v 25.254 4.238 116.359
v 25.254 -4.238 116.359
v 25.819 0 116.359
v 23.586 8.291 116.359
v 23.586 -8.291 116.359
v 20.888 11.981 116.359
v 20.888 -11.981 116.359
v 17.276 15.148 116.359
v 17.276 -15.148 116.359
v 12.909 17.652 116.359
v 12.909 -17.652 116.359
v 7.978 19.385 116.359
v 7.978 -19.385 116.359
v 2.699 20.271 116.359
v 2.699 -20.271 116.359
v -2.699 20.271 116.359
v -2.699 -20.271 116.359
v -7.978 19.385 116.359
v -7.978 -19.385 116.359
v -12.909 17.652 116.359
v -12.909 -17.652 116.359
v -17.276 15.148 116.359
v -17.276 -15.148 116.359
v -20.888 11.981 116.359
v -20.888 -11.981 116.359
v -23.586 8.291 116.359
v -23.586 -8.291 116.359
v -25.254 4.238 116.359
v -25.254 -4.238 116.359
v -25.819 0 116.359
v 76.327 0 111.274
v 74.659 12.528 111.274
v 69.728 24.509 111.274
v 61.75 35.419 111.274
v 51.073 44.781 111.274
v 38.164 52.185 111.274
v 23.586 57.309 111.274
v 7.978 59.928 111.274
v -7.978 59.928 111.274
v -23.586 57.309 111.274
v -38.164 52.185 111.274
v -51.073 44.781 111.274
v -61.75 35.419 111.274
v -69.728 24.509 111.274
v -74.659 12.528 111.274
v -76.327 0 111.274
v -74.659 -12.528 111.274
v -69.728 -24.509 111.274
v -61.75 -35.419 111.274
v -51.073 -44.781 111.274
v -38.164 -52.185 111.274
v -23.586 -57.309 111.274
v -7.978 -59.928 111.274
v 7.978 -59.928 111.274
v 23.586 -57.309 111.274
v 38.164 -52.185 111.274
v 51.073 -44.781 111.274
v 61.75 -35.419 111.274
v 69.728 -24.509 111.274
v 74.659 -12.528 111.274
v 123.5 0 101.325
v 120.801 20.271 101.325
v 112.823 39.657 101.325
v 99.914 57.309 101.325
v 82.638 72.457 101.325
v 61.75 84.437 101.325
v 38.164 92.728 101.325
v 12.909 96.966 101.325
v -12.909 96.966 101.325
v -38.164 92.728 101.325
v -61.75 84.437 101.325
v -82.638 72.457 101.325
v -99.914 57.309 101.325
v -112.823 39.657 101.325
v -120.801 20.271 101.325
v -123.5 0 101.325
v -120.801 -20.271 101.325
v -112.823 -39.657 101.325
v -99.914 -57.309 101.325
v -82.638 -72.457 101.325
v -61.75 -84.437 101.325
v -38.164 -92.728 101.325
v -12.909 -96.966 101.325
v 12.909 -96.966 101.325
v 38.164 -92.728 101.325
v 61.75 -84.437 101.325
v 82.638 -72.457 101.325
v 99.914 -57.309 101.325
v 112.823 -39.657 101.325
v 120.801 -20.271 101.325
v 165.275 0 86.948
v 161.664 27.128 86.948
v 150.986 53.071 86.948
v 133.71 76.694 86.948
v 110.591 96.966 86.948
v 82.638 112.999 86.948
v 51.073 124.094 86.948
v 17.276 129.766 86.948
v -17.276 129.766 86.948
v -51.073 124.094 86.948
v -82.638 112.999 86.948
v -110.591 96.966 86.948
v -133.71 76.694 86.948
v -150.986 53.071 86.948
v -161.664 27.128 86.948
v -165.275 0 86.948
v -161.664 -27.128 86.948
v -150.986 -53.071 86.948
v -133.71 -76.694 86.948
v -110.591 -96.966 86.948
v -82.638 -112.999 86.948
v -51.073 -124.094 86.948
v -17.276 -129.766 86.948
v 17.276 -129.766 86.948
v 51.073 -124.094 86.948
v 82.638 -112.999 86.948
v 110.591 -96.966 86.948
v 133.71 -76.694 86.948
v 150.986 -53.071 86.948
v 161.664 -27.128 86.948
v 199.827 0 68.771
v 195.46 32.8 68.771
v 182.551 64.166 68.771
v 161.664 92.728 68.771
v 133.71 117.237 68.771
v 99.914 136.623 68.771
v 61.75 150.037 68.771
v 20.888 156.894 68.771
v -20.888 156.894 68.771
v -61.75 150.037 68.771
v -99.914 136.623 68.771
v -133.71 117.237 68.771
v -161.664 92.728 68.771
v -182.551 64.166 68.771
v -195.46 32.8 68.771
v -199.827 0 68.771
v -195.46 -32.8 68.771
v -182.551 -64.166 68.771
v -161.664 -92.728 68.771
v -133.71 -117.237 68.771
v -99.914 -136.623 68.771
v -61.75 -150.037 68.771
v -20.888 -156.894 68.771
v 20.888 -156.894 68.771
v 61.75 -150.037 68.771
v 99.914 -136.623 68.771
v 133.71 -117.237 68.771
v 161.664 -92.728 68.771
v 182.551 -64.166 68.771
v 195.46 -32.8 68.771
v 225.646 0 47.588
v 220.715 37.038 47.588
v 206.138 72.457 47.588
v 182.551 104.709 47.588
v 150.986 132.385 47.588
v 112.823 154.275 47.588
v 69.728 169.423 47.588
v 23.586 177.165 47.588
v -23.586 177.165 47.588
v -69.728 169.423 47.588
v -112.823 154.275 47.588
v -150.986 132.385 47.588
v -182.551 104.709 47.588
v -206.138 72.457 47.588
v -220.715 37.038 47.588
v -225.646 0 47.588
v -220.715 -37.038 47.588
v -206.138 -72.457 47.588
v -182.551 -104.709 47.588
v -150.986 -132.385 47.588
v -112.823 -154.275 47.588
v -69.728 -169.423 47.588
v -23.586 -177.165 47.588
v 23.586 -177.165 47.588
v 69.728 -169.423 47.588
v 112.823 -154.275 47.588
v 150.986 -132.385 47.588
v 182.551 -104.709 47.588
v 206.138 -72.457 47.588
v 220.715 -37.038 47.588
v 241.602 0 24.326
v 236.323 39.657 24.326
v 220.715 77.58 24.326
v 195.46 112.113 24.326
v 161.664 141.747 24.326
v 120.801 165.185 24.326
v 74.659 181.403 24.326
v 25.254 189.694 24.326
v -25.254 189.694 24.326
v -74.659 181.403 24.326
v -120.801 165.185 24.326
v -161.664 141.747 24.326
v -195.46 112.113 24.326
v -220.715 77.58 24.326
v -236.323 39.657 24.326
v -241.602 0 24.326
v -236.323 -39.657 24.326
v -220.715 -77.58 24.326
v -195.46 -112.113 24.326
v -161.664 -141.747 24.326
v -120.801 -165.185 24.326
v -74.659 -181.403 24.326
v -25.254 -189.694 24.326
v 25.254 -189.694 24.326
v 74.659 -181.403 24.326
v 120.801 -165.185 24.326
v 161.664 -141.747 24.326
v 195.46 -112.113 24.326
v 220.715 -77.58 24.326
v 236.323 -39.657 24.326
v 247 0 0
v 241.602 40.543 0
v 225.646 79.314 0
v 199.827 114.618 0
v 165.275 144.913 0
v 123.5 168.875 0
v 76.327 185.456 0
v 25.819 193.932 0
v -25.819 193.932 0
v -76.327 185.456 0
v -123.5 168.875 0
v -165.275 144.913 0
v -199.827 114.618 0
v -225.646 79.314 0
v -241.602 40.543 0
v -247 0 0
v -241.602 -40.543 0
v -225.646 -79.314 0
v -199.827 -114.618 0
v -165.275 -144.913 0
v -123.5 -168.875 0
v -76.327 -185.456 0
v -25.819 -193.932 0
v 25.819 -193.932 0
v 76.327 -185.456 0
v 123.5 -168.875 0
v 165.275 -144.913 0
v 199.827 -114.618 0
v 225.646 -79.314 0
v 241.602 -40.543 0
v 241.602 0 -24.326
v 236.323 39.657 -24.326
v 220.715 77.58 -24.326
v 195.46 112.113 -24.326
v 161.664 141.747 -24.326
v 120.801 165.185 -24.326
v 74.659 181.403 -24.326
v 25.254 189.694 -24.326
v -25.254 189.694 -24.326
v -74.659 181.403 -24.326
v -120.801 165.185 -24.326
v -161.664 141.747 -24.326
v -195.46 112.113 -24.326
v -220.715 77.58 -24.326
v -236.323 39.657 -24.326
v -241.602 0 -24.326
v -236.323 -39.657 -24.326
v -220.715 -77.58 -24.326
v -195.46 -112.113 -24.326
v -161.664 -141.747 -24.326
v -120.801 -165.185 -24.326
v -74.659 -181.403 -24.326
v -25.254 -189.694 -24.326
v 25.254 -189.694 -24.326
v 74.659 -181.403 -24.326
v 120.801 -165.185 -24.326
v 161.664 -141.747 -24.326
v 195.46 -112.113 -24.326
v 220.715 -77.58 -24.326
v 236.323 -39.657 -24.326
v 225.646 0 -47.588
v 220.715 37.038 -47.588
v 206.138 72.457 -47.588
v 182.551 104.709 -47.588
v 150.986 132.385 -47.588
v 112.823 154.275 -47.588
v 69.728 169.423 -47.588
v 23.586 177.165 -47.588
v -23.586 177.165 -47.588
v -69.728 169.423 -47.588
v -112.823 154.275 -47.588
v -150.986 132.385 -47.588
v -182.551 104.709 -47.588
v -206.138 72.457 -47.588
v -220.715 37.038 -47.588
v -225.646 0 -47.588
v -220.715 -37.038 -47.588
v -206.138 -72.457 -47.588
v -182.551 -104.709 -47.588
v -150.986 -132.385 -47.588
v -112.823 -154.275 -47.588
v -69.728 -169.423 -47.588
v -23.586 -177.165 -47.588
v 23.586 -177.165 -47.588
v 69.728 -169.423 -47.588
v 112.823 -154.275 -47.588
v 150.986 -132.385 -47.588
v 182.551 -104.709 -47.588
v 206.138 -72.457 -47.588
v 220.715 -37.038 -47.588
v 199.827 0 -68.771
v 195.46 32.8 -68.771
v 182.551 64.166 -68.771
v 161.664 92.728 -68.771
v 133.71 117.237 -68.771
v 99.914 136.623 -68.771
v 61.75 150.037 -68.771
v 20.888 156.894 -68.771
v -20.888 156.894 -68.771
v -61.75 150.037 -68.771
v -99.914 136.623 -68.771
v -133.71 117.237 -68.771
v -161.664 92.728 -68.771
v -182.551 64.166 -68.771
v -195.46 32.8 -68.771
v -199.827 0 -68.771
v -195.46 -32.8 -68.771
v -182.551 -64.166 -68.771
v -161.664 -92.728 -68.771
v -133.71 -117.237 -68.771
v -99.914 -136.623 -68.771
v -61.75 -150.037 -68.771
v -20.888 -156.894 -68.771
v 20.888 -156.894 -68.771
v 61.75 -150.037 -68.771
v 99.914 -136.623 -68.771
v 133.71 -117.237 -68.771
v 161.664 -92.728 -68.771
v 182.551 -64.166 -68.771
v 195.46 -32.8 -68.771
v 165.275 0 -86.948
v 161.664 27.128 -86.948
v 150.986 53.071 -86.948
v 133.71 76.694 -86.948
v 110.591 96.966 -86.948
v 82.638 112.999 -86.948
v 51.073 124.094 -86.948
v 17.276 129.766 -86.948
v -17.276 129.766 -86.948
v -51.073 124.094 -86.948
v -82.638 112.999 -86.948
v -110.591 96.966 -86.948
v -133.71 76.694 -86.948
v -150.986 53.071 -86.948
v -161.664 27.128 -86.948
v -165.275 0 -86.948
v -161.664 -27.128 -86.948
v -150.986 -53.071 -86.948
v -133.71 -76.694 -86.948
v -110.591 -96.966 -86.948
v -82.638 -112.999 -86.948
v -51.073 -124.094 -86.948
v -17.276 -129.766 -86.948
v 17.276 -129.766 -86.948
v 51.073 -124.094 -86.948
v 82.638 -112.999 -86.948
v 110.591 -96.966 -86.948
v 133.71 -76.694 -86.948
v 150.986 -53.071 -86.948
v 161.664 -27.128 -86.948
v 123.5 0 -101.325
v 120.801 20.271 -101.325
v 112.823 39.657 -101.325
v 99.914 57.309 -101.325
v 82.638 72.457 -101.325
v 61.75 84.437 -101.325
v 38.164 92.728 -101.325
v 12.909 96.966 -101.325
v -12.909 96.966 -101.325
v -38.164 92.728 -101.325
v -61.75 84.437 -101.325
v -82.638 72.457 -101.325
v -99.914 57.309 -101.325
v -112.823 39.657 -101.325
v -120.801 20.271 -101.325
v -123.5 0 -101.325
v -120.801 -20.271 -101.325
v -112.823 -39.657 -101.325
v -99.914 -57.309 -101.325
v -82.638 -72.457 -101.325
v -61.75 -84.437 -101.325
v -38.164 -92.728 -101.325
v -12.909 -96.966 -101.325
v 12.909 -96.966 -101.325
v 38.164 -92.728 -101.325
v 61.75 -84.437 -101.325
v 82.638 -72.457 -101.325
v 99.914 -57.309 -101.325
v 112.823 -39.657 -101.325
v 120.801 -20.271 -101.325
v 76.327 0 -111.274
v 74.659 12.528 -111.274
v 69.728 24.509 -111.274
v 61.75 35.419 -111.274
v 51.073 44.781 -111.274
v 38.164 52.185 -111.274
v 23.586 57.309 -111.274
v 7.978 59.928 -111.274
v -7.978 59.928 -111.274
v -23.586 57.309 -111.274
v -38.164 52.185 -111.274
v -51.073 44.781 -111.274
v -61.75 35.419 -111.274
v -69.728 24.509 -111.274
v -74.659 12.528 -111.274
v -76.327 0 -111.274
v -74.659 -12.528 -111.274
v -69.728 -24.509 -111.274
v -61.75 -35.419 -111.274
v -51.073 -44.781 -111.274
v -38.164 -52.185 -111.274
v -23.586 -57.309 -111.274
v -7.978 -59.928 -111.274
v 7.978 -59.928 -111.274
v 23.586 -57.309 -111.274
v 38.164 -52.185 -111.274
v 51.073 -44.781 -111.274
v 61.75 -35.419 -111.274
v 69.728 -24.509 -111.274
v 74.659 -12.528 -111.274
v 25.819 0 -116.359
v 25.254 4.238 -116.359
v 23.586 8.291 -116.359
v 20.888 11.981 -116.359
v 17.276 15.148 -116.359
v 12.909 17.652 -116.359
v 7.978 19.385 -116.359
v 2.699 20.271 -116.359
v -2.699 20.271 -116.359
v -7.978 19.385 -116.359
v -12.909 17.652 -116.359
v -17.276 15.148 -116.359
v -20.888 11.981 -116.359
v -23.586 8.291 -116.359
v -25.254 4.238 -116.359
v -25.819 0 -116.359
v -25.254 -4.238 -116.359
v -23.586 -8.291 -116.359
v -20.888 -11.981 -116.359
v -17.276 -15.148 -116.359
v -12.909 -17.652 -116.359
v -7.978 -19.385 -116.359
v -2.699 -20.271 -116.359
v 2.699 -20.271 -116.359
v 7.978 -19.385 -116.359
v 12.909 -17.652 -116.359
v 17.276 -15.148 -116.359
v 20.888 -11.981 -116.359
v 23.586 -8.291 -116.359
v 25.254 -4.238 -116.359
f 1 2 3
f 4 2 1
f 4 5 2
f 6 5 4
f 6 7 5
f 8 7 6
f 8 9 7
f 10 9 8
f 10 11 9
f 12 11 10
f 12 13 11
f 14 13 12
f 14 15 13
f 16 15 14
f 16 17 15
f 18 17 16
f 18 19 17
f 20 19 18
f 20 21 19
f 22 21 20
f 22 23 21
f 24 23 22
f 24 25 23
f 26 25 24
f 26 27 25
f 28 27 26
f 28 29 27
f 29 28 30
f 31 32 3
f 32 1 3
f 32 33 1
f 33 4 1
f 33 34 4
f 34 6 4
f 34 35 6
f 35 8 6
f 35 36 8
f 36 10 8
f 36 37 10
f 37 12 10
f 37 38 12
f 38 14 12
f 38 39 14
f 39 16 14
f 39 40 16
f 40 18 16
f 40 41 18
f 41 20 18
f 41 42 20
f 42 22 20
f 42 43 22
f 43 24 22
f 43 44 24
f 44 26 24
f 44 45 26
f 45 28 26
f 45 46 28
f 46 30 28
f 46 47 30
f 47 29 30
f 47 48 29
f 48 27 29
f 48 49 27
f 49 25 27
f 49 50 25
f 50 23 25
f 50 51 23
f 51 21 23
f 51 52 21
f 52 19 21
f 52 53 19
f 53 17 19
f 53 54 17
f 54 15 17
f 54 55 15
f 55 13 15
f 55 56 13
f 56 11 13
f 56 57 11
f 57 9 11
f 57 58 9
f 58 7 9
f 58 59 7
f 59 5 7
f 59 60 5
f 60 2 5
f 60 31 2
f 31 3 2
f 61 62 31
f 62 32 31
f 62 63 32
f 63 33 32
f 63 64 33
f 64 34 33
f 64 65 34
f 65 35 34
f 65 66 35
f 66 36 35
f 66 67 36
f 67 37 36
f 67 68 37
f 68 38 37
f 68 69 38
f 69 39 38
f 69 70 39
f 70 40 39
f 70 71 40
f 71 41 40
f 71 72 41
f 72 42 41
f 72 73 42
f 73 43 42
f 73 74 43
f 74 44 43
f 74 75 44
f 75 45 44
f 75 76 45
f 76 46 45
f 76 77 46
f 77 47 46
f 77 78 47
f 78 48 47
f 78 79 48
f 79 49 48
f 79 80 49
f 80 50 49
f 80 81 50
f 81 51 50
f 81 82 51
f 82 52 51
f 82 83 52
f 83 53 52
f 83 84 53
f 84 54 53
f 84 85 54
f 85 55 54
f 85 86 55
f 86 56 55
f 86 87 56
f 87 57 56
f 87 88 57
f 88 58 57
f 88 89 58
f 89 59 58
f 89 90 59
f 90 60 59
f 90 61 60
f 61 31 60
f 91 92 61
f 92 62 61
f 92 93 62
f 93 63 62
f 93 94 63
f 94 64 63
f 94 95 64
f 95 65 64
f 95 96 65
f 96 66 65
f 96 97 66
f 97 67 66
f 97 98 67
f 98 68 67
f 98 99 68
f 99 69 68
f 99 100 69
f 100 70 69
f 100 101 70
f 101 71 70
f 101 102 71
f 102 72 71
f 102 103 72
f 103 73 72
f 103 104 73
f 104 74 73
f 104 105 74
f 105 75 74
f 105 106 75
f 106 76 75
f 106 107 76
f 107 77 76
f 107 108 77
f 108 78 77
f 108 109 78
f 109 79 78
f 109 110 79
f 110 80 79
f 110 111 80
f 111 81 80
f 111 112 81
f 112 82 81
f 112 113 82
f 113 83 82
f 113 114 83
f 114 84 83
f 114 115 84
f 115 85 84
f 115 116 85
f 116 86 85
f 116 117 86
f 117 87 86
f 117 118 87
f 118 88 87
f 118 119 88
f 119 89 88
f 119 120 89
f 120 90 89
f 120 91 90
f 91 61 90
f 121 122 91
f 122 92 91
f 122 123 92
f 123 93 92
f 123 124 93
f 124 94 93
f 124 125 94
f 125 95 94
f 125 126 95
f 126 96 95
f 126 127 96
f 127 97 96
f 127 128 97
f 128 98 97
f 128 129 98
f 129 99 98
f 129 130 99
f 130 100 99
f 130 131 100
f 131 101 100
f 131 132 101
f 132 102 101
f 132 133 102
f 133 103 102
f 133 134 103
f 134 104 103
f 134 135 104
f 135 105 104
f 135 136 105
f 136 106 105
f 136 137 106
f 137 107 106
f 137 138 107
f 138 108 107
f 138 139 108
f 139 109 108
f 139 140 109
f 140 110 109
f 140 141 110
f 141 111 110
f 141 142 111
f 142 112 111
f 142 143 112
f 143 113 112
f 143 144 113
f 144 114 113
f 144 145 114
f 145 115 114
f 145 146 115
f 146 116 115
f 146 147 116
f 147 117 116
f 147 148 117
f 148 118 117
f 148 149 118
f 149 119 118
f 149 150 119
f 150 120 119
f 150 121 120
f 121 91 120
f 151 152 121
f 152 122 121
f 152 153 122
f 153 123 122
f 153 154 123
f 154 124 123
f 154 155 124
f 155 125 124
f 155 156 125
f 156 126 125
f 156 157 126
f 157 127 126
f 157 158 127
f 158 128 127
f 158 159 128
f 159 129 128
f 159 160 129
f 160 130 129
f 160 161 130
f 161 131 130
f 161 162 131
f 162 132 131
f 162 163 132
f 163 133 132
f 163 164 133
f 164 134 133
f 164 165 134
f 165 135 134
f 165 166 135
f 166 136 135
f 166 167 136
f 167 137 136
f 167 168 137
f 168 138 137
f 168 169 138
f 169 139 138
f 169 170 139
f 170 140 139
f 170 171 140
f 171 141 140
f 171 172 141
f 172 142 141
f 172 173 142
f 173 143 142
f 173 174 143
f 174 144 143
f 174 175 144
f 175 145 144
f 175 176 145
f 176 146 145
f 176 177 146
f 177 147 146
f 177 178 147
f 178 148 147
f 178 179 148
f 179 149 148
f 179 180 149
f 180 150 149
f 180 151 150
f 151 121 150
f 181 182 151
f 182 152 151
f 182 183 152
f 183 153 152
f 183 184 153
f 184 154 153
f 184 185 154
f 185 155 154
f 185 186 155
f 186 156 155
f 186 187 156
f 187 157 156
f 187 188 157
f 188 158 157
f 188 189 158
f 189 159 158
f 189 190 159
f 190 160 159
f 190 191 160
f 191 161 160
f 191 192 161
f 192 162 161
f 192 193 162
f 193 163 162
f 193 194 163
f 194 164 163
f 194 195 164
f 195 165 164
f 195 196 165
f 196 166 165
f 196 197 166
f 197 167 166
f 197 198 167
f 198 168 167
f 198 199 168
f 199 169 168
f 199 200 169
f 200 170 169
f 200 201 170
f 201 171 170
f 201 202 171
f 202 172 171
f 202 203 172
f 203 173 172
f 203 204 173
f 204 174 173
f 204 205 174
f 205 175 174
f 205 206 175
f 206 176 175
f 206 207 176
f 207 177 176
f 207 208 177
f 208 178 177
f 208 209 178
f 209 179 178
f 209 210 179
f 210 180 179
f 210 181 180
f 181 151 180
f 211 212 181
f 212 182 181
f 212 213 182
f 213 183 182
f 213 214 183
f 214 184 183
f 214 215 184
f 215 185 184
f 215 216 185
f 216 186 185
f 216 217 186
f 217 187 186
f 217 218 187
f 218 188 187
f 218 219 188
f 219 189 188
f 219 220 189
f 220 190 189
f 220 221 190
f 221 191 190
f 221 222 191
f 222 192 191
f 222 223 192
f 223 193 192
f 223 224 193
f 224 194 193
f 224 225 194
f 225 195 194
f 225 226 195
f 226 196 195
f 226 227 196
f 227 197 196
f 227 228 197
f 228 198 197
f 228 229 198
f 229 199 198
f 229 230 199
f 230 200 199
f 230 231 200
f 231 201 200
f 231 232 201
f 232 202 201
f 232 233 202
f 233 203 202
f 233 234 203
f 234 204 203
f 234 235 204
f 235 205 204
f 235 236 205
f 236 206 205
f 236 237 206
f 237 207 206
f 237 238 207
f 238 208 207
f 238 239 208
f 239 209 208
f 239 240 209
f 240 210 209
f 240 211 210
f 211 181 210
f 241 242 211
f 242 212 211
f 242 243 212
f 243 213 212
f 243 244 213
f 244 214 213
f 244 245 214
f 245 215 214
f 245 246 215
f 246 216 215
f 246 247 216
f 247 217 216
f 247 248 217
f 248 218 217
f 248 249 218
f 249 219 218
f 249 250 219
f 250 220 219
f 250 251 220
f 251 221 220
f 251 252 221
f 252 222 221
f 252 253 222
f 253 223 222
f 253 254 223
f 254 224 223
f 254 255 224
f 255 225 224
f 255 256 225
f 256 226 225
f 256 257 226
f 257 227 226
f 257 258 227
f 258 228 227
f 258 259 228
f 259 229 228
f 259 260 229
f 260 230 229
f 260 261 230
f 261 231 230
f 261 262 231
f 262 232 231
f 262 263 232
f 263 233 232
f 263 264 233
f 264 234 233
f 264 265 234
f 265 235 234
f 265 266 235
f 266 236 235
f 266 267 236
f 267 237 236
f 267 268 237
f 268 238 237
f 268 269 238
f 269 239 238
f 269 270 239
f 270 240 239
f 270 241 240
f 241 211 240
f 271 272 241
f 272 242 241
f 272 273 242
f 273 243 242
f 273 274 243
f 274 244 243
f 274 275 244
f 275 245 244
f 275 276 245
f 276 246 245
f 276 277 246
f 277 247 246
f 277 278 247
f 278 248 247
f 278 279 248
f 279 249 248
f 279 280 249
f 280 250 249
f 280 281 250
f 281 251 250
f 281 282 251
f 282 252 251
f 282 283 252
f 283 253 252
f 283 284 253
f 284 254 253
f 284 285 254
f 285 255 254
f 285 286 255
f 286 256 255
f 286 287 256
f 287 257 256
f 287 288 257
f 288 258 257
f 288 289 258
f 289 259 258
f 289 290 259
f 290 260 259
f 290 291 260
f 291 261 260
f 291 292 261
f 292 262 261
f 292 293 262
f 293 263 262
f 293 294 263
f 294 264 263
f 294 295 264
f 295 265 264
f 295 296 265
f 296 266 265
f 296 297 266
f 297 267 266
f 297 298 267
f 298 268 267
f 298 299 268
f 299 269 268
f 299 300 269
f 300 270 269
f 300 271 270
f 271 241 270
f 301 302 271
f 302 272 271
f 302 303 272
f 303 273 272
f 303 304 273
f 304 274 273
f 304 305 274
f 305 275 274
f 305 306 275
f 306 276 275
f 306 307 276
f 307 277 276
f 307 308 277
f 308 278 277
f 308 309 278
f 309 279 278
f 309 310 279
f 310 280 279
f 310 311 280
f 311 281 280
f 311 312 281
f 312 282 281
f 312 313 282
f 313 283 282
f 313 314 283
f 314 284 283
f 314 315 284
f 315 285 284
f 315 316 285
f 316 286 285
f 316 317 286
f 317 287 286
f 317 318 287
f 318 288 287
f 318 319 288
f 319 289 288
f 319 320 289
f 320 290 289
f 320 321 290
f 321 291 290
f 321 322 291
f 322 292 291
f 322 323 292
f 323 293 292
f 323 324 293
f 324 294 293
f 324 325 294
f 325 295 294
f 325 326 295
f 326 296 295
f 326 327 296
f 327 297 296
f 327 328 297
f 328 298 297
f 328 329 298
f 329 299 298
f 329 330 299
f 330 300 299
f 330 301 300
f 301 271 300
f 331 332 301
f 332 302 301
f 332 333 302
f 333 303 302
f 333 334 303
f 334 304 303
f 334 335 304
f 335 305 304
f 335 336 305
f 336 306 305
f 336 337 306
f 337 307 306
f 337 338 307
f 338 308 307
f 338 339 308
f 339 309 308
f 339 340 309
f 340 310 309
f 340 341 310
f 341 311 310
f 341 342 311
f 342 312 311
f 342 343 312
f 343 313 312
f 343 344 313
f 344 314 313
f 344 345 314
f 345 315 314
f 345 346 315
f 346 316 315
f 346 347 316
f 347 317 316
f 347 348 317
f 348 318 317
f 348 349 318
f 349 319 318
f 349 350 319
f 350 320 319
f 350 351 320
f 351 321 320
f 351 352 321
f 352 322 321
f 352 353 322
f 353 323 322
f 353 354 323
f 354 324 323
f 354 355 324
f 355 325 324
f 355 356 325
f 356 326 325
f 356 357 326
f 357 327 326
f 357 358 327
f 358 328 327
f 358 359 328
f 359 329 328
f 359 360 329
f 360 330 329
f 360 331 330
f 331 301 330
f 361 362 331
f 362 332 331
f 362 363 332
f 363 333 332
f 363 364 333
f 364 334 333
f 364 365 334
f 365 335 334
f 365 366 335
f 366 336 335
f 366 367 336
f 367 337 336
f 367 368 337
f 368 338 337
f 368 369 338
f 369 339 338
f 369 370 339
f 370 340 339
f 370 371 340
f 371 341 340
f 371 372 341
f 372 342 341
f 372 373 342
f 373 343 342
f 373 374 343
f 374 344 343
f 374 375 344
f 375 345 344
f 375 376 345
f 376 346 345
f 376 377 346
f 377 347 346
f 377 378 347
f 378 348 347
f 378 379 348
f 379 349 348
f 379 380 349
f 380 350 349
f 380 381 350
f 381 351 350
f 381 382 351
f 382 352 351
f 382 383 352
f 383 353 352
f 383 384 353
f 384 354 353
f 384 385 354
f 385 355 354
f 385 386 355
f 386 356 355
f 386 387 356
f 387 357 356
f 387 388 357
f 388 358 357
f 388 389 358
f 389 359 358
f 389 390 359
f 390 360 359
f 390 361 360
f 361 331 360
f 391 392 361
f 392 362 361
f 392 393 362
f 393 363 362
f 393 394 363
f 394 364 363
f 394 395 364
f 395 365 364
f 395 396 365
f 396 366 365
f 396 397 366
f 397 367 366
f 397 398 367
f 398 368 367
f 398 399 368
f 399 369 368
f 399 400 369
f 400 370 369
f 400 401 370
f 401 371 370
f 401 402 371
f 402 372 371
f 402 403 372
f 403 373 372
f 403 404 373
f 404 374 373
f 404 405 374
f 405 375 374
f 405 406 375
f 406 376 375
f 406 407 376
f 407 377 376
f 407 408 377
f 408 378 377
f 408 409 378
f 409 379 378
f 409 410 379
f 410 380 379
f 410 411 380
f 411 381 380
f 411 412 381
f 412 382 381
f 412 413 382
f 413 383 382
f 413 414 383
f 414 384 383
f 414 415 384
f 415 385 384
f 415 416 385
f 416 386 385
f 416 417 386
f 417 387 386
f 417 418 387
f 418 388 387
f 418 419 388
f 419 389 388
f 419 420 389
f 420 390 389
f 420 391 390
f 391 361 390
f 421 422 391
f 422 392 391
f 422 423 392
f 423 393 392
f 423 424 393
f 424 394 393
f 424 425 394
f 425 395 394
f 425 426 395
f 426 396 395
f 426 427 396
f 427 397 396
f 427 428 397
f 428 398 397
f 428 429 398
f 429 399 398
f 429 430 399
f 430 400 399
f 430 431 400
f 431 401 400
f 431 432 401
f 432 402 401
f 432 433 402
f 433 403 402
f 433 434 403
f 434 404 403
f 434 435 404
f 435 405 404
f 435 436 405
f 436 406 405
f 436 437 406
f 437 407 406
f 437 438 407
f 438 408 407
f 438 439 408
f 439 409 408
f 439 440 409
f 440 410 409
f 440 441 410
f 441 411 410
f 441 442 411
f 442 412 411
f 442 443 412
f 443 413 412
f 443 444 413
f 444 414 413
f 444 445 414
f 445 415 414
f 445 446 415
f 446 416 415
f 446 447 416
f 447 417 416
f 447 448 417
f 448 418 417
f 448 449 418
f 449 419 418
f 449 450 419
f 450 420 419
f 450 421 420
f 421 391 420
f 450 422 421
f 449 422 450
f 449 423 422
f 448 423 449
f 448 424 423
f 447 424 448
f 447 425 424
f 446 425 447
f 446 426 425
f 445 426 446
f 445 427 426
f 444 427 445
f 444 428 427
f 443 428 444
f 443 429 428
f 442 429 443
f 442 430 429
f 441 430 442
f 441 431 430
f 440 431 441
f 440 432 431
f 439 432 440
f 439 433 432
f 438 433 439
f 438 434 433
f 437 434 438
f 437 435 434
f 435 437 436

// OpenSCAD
// Generated by SolidPython 1.0.1 on 2020-07-29 00:46:54


scale(v = [19, 15, 9]) {
	sphere(r = 13);
}
/***********************************************
*********      SolidPython code:      **********
************************************************
 
# import packages: SolidPython
from solid import *
from solid.utils import *
from itertools import chain, combinations, permutations


class Resize:

    def __init__(self, scad_file):
        self.scad_file = scad_file
        #self.scad_file = import_scad(scad_file)
        # cone/cylinder param:
        self.r1 = 0
        self.r2 = 0
        self.h = 0
        # rectangular prism param:
        self.w = 0
        self.l = 0
        # ellipse param:
        self.r = 0

    # import OpenScad code (file name corresponds to shape)


    # classify shape + parameters
    def assign(self, param1, param2, param3):
        if self.scad_file == 'cone.scad':
            self.r1 = param1
            self.r2 = param2
            self.h = param3
        elif self.scad_file == 'cylinder.scad':
            self.r1 = param1
            self.r2 = param2
            self.h = param3
        elif self.scad_file == 'rectangularPrism.scad':
            self.h = param1
            self.l = param2
            self.w = param3
        else:
            self.r = param1
            self.h = param2

    # resize parameters
    def iterate(self):
        x = range(3, 20, 2)
        i = 1
        if self.scad_file == 'cone.scad':
            tempList = list(permutations(x, 2))
            for temp in tempList:
                param1 = temp[0]
                param2 = temp[1]
                filepath = 'produced_scad_files/' + 'cone' + str(param1) + '_' + str(param2) + '_' + '.scad'
                scad_render_to_file(cylinder(h=param1, r1=param2, r2=0), filepath)

        elif self.scad_file == 'cylinder.scad':
            tempList = list(permutations(x, 3))
            for temp in tempList:
                param1 = temp[0]
                param2 = temp[1]
                filepath = 'produced_scad_files/' + 'cylinder' + str(param1) + '_' + str(param2) + '_' + '.scad'
                scad_render_to_file(cylinder(h=param1, r1=param2, r2=param2), filepath)

        elif self.scad_file == 'rectangularPrism.scad':
            tempList = list(permutations(x, 3))
            for temp in tempList:
                param1 = temp[0]
                param2 = temp[1]
                param3 = temp[2]
                filepath = 'produced_scad_files/' + 'rectangularPrism' + str(param1) + '_' + str(param2) + '_' + str(
                    param3) + '.scad'
                scad_render_to_file(cube(size=(param1, param2, param3)), filepath)

        elif self.scad_file == 'ellipse.scad':
            tempList = list(permutations(x, 4))
            for temp in tempList:
                param1 = temp[0]
                param2 = temp[1]
                param3 = temp[2]
                param4 = temp[3]
                filepath = 'produced_scad_files/' + 'ellipse' + str(param1) + '_' + str(param2) + '_' + str(param3) + '_' + str(param4) + '.scad'
                scad_render_to_file(scale([param1, param2, param3])(sphere(r=param4)), filepath)

    def render_to_scadfile(self):
        scad_render_to_file(scad, 'example.scad') 
 
************************************************/
